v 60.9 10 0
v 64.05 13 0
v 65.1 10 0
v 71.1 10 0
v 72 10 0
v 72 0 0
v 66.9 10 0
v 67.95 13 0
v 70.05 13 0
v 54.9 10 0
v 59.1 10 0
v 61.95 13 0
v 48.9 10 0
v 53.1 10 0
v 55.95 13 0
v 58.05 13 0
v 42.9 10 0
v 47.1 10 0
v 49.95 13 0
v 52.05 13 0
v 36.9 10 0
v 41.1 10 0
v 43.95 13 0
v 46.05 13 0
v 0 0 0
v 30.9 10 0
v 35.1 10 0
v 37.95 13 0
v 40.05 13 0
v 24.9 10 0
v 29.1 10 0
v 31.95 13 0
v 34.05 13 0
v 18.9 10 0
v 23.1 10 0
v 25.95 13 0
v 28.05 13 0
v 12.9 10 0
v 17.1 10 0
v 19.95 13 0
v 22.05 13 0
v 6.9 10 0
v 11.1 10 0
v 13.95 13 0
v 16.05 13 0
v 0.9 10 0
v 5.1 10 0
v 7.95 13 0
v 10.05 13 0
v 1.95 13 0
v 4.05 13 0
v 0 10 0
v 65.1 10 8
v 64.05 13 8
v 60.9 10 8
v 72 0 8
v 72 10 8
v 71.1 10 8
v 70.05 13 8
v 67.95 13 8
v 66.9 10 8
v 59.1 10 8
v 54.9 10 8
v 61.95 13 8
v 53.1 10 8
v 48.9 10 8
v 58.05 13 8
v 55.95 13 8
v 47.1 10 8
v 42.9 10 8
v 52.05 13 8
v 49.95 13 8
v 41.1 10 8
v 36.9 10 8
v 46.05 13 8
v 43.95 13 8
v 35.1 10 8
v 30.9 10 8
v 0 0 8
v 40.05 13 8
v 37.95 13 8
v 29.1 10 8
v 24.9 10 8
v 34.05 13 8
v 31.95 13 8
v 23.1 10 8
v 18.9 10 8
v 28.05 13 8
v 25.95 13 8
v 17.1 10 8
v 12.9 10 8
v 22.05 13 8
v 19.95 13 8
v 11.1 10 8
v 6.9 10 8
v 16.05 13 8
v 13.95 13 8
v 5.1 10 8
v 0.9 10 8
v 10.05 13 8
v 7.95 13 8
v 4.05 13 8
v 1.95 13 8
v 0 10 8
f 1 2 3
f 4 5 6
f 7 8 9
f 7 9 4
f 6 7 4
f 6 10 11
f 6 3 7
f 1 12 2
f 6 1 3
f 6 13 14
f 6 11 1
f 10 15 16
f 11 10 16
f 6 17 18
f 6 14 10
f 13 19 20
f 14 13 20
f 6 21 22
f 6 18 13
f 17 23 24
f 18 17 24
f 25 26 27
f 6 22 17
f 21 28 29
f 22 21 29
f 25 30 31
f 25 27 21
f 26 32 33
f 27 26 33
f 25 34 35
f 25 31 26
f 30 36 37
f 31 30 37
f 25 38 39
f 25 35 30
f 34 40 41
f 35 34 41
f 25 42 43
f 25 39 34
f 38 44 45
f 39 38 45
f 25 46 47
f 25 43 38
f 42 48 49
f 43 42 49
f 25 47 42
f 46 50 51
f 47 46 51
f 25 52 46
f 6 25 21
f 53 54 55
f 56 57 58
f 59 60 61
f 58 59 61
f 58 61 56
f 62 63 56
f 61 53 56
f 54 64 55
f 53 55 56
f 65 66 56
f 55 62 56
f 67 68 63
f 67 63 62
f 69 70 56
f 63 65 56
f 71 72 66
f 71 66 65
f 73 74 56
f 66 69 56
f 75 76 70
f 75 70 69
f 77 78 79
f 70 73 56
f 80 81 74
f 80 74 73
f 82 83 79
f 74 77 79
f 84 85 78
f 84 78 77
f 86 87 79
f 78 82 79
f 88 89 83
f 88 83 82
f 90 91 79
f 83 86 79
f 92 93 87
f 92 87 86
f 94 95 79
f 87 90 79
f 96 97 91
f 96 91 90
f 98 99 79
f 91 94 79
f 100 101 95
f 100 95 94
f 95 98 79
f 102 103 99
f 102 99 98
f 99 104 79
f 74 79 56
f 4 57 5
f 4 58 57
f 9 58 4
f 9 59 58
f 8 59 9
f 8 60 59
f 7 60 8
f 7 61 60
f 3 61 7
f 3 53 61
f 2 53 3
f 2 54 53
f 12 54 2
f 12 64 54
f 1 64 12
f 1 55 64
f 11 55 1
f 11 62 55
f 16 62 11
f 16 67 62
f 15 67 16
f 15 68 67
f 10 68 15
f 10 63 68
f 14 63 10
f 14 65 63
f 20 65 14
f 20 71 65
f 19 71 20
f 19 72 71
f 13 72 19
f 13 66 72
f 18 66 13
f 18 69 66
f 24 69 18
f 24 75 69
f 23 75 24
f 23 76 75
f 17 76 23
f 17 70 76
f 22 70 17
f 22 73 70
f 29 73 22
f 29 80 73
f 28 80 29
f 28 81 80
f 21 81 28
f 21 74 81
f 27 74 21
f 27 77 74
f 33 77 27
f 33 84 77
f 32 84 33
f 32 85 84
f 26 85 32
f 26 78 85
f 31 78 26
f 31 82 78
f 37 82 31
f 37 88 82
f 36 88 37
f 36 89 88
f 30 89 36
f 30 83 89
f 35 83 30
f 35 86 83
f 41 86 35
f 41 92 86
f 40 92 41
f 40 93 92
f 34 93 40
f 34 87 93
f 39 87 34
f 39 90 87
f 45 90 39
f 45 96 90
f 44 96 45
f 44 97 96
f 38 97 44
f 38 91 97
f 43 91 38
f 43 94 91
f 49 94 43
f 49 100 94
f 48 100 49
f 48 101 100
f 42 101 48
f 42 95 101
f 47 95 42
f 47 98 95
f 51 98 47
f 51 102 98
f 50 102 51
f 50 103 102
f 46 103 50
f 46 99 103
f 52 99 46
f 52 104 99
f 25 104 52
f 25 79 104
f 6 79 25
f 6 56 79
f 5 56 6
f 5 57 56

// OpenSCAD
$fn = 32;

// ----------------------------------------------------------------------
// Gear rack: 12 teeth, pitch 6 mm
// ----------------------------------------------------------------------

// --- parameters (mm) ---
teeth = 12;               // number of teeth
pitch = 6;                // tooth pitch, X
root_w = 4.2;             // tooth width at the root
tip_w = 2.1;              // tooth width at the tip
base_h = 10;              // rack body height, Y
tooth_h = 3;              // tooth height above the body
plate_t = 8;              // rack width, Z (extrusion height)

rack_l = teeth * pitch;  // overall length
total_h = base_h + tooth_h;  // overall height

profile = [[0, 0], [72, 0], [72, 10], [71.1, 10], [70.05, 13], [67.95, 13], [66.9, 10], [65.1, 10], [64.05, 13], [61.95, 13], [60.9, 10], [59.1, 10], [58.05, 13], [55.95, 13], [54.9, 10], [53.1, 10], [52.05, 13], [49.95, 13], [48.9, 10], [47.1, 10], [46.05, 13], [43.95, 13], [42.9, 10], [41.1, 10], [40.05, 13], [37.95, 13], [36.9, 10], [35.1, 10], [34.05, 13], [31.95, 13], [30.9, 10], [29.1, 10], [28.05, 13], [25.95, 13], [24.9, 10], [23.1, 10], [22.05, 13], [19.95, 13], [18.9, 10], [17.1, 10], [16.05, 13], [13.95, 13], [12.9, 10], [11.1, 10], [10.05, 13], [7.95, 13], [6.9, 10], [5.1, 10], [4.05, 13], [1.95, 13], [0.9, 10], [0, 10]];  // primary outline, 52 points, counter clockwise

// --- the one profile operation ---
linear_extrude(height = plate_t) polygon(points = profile);
